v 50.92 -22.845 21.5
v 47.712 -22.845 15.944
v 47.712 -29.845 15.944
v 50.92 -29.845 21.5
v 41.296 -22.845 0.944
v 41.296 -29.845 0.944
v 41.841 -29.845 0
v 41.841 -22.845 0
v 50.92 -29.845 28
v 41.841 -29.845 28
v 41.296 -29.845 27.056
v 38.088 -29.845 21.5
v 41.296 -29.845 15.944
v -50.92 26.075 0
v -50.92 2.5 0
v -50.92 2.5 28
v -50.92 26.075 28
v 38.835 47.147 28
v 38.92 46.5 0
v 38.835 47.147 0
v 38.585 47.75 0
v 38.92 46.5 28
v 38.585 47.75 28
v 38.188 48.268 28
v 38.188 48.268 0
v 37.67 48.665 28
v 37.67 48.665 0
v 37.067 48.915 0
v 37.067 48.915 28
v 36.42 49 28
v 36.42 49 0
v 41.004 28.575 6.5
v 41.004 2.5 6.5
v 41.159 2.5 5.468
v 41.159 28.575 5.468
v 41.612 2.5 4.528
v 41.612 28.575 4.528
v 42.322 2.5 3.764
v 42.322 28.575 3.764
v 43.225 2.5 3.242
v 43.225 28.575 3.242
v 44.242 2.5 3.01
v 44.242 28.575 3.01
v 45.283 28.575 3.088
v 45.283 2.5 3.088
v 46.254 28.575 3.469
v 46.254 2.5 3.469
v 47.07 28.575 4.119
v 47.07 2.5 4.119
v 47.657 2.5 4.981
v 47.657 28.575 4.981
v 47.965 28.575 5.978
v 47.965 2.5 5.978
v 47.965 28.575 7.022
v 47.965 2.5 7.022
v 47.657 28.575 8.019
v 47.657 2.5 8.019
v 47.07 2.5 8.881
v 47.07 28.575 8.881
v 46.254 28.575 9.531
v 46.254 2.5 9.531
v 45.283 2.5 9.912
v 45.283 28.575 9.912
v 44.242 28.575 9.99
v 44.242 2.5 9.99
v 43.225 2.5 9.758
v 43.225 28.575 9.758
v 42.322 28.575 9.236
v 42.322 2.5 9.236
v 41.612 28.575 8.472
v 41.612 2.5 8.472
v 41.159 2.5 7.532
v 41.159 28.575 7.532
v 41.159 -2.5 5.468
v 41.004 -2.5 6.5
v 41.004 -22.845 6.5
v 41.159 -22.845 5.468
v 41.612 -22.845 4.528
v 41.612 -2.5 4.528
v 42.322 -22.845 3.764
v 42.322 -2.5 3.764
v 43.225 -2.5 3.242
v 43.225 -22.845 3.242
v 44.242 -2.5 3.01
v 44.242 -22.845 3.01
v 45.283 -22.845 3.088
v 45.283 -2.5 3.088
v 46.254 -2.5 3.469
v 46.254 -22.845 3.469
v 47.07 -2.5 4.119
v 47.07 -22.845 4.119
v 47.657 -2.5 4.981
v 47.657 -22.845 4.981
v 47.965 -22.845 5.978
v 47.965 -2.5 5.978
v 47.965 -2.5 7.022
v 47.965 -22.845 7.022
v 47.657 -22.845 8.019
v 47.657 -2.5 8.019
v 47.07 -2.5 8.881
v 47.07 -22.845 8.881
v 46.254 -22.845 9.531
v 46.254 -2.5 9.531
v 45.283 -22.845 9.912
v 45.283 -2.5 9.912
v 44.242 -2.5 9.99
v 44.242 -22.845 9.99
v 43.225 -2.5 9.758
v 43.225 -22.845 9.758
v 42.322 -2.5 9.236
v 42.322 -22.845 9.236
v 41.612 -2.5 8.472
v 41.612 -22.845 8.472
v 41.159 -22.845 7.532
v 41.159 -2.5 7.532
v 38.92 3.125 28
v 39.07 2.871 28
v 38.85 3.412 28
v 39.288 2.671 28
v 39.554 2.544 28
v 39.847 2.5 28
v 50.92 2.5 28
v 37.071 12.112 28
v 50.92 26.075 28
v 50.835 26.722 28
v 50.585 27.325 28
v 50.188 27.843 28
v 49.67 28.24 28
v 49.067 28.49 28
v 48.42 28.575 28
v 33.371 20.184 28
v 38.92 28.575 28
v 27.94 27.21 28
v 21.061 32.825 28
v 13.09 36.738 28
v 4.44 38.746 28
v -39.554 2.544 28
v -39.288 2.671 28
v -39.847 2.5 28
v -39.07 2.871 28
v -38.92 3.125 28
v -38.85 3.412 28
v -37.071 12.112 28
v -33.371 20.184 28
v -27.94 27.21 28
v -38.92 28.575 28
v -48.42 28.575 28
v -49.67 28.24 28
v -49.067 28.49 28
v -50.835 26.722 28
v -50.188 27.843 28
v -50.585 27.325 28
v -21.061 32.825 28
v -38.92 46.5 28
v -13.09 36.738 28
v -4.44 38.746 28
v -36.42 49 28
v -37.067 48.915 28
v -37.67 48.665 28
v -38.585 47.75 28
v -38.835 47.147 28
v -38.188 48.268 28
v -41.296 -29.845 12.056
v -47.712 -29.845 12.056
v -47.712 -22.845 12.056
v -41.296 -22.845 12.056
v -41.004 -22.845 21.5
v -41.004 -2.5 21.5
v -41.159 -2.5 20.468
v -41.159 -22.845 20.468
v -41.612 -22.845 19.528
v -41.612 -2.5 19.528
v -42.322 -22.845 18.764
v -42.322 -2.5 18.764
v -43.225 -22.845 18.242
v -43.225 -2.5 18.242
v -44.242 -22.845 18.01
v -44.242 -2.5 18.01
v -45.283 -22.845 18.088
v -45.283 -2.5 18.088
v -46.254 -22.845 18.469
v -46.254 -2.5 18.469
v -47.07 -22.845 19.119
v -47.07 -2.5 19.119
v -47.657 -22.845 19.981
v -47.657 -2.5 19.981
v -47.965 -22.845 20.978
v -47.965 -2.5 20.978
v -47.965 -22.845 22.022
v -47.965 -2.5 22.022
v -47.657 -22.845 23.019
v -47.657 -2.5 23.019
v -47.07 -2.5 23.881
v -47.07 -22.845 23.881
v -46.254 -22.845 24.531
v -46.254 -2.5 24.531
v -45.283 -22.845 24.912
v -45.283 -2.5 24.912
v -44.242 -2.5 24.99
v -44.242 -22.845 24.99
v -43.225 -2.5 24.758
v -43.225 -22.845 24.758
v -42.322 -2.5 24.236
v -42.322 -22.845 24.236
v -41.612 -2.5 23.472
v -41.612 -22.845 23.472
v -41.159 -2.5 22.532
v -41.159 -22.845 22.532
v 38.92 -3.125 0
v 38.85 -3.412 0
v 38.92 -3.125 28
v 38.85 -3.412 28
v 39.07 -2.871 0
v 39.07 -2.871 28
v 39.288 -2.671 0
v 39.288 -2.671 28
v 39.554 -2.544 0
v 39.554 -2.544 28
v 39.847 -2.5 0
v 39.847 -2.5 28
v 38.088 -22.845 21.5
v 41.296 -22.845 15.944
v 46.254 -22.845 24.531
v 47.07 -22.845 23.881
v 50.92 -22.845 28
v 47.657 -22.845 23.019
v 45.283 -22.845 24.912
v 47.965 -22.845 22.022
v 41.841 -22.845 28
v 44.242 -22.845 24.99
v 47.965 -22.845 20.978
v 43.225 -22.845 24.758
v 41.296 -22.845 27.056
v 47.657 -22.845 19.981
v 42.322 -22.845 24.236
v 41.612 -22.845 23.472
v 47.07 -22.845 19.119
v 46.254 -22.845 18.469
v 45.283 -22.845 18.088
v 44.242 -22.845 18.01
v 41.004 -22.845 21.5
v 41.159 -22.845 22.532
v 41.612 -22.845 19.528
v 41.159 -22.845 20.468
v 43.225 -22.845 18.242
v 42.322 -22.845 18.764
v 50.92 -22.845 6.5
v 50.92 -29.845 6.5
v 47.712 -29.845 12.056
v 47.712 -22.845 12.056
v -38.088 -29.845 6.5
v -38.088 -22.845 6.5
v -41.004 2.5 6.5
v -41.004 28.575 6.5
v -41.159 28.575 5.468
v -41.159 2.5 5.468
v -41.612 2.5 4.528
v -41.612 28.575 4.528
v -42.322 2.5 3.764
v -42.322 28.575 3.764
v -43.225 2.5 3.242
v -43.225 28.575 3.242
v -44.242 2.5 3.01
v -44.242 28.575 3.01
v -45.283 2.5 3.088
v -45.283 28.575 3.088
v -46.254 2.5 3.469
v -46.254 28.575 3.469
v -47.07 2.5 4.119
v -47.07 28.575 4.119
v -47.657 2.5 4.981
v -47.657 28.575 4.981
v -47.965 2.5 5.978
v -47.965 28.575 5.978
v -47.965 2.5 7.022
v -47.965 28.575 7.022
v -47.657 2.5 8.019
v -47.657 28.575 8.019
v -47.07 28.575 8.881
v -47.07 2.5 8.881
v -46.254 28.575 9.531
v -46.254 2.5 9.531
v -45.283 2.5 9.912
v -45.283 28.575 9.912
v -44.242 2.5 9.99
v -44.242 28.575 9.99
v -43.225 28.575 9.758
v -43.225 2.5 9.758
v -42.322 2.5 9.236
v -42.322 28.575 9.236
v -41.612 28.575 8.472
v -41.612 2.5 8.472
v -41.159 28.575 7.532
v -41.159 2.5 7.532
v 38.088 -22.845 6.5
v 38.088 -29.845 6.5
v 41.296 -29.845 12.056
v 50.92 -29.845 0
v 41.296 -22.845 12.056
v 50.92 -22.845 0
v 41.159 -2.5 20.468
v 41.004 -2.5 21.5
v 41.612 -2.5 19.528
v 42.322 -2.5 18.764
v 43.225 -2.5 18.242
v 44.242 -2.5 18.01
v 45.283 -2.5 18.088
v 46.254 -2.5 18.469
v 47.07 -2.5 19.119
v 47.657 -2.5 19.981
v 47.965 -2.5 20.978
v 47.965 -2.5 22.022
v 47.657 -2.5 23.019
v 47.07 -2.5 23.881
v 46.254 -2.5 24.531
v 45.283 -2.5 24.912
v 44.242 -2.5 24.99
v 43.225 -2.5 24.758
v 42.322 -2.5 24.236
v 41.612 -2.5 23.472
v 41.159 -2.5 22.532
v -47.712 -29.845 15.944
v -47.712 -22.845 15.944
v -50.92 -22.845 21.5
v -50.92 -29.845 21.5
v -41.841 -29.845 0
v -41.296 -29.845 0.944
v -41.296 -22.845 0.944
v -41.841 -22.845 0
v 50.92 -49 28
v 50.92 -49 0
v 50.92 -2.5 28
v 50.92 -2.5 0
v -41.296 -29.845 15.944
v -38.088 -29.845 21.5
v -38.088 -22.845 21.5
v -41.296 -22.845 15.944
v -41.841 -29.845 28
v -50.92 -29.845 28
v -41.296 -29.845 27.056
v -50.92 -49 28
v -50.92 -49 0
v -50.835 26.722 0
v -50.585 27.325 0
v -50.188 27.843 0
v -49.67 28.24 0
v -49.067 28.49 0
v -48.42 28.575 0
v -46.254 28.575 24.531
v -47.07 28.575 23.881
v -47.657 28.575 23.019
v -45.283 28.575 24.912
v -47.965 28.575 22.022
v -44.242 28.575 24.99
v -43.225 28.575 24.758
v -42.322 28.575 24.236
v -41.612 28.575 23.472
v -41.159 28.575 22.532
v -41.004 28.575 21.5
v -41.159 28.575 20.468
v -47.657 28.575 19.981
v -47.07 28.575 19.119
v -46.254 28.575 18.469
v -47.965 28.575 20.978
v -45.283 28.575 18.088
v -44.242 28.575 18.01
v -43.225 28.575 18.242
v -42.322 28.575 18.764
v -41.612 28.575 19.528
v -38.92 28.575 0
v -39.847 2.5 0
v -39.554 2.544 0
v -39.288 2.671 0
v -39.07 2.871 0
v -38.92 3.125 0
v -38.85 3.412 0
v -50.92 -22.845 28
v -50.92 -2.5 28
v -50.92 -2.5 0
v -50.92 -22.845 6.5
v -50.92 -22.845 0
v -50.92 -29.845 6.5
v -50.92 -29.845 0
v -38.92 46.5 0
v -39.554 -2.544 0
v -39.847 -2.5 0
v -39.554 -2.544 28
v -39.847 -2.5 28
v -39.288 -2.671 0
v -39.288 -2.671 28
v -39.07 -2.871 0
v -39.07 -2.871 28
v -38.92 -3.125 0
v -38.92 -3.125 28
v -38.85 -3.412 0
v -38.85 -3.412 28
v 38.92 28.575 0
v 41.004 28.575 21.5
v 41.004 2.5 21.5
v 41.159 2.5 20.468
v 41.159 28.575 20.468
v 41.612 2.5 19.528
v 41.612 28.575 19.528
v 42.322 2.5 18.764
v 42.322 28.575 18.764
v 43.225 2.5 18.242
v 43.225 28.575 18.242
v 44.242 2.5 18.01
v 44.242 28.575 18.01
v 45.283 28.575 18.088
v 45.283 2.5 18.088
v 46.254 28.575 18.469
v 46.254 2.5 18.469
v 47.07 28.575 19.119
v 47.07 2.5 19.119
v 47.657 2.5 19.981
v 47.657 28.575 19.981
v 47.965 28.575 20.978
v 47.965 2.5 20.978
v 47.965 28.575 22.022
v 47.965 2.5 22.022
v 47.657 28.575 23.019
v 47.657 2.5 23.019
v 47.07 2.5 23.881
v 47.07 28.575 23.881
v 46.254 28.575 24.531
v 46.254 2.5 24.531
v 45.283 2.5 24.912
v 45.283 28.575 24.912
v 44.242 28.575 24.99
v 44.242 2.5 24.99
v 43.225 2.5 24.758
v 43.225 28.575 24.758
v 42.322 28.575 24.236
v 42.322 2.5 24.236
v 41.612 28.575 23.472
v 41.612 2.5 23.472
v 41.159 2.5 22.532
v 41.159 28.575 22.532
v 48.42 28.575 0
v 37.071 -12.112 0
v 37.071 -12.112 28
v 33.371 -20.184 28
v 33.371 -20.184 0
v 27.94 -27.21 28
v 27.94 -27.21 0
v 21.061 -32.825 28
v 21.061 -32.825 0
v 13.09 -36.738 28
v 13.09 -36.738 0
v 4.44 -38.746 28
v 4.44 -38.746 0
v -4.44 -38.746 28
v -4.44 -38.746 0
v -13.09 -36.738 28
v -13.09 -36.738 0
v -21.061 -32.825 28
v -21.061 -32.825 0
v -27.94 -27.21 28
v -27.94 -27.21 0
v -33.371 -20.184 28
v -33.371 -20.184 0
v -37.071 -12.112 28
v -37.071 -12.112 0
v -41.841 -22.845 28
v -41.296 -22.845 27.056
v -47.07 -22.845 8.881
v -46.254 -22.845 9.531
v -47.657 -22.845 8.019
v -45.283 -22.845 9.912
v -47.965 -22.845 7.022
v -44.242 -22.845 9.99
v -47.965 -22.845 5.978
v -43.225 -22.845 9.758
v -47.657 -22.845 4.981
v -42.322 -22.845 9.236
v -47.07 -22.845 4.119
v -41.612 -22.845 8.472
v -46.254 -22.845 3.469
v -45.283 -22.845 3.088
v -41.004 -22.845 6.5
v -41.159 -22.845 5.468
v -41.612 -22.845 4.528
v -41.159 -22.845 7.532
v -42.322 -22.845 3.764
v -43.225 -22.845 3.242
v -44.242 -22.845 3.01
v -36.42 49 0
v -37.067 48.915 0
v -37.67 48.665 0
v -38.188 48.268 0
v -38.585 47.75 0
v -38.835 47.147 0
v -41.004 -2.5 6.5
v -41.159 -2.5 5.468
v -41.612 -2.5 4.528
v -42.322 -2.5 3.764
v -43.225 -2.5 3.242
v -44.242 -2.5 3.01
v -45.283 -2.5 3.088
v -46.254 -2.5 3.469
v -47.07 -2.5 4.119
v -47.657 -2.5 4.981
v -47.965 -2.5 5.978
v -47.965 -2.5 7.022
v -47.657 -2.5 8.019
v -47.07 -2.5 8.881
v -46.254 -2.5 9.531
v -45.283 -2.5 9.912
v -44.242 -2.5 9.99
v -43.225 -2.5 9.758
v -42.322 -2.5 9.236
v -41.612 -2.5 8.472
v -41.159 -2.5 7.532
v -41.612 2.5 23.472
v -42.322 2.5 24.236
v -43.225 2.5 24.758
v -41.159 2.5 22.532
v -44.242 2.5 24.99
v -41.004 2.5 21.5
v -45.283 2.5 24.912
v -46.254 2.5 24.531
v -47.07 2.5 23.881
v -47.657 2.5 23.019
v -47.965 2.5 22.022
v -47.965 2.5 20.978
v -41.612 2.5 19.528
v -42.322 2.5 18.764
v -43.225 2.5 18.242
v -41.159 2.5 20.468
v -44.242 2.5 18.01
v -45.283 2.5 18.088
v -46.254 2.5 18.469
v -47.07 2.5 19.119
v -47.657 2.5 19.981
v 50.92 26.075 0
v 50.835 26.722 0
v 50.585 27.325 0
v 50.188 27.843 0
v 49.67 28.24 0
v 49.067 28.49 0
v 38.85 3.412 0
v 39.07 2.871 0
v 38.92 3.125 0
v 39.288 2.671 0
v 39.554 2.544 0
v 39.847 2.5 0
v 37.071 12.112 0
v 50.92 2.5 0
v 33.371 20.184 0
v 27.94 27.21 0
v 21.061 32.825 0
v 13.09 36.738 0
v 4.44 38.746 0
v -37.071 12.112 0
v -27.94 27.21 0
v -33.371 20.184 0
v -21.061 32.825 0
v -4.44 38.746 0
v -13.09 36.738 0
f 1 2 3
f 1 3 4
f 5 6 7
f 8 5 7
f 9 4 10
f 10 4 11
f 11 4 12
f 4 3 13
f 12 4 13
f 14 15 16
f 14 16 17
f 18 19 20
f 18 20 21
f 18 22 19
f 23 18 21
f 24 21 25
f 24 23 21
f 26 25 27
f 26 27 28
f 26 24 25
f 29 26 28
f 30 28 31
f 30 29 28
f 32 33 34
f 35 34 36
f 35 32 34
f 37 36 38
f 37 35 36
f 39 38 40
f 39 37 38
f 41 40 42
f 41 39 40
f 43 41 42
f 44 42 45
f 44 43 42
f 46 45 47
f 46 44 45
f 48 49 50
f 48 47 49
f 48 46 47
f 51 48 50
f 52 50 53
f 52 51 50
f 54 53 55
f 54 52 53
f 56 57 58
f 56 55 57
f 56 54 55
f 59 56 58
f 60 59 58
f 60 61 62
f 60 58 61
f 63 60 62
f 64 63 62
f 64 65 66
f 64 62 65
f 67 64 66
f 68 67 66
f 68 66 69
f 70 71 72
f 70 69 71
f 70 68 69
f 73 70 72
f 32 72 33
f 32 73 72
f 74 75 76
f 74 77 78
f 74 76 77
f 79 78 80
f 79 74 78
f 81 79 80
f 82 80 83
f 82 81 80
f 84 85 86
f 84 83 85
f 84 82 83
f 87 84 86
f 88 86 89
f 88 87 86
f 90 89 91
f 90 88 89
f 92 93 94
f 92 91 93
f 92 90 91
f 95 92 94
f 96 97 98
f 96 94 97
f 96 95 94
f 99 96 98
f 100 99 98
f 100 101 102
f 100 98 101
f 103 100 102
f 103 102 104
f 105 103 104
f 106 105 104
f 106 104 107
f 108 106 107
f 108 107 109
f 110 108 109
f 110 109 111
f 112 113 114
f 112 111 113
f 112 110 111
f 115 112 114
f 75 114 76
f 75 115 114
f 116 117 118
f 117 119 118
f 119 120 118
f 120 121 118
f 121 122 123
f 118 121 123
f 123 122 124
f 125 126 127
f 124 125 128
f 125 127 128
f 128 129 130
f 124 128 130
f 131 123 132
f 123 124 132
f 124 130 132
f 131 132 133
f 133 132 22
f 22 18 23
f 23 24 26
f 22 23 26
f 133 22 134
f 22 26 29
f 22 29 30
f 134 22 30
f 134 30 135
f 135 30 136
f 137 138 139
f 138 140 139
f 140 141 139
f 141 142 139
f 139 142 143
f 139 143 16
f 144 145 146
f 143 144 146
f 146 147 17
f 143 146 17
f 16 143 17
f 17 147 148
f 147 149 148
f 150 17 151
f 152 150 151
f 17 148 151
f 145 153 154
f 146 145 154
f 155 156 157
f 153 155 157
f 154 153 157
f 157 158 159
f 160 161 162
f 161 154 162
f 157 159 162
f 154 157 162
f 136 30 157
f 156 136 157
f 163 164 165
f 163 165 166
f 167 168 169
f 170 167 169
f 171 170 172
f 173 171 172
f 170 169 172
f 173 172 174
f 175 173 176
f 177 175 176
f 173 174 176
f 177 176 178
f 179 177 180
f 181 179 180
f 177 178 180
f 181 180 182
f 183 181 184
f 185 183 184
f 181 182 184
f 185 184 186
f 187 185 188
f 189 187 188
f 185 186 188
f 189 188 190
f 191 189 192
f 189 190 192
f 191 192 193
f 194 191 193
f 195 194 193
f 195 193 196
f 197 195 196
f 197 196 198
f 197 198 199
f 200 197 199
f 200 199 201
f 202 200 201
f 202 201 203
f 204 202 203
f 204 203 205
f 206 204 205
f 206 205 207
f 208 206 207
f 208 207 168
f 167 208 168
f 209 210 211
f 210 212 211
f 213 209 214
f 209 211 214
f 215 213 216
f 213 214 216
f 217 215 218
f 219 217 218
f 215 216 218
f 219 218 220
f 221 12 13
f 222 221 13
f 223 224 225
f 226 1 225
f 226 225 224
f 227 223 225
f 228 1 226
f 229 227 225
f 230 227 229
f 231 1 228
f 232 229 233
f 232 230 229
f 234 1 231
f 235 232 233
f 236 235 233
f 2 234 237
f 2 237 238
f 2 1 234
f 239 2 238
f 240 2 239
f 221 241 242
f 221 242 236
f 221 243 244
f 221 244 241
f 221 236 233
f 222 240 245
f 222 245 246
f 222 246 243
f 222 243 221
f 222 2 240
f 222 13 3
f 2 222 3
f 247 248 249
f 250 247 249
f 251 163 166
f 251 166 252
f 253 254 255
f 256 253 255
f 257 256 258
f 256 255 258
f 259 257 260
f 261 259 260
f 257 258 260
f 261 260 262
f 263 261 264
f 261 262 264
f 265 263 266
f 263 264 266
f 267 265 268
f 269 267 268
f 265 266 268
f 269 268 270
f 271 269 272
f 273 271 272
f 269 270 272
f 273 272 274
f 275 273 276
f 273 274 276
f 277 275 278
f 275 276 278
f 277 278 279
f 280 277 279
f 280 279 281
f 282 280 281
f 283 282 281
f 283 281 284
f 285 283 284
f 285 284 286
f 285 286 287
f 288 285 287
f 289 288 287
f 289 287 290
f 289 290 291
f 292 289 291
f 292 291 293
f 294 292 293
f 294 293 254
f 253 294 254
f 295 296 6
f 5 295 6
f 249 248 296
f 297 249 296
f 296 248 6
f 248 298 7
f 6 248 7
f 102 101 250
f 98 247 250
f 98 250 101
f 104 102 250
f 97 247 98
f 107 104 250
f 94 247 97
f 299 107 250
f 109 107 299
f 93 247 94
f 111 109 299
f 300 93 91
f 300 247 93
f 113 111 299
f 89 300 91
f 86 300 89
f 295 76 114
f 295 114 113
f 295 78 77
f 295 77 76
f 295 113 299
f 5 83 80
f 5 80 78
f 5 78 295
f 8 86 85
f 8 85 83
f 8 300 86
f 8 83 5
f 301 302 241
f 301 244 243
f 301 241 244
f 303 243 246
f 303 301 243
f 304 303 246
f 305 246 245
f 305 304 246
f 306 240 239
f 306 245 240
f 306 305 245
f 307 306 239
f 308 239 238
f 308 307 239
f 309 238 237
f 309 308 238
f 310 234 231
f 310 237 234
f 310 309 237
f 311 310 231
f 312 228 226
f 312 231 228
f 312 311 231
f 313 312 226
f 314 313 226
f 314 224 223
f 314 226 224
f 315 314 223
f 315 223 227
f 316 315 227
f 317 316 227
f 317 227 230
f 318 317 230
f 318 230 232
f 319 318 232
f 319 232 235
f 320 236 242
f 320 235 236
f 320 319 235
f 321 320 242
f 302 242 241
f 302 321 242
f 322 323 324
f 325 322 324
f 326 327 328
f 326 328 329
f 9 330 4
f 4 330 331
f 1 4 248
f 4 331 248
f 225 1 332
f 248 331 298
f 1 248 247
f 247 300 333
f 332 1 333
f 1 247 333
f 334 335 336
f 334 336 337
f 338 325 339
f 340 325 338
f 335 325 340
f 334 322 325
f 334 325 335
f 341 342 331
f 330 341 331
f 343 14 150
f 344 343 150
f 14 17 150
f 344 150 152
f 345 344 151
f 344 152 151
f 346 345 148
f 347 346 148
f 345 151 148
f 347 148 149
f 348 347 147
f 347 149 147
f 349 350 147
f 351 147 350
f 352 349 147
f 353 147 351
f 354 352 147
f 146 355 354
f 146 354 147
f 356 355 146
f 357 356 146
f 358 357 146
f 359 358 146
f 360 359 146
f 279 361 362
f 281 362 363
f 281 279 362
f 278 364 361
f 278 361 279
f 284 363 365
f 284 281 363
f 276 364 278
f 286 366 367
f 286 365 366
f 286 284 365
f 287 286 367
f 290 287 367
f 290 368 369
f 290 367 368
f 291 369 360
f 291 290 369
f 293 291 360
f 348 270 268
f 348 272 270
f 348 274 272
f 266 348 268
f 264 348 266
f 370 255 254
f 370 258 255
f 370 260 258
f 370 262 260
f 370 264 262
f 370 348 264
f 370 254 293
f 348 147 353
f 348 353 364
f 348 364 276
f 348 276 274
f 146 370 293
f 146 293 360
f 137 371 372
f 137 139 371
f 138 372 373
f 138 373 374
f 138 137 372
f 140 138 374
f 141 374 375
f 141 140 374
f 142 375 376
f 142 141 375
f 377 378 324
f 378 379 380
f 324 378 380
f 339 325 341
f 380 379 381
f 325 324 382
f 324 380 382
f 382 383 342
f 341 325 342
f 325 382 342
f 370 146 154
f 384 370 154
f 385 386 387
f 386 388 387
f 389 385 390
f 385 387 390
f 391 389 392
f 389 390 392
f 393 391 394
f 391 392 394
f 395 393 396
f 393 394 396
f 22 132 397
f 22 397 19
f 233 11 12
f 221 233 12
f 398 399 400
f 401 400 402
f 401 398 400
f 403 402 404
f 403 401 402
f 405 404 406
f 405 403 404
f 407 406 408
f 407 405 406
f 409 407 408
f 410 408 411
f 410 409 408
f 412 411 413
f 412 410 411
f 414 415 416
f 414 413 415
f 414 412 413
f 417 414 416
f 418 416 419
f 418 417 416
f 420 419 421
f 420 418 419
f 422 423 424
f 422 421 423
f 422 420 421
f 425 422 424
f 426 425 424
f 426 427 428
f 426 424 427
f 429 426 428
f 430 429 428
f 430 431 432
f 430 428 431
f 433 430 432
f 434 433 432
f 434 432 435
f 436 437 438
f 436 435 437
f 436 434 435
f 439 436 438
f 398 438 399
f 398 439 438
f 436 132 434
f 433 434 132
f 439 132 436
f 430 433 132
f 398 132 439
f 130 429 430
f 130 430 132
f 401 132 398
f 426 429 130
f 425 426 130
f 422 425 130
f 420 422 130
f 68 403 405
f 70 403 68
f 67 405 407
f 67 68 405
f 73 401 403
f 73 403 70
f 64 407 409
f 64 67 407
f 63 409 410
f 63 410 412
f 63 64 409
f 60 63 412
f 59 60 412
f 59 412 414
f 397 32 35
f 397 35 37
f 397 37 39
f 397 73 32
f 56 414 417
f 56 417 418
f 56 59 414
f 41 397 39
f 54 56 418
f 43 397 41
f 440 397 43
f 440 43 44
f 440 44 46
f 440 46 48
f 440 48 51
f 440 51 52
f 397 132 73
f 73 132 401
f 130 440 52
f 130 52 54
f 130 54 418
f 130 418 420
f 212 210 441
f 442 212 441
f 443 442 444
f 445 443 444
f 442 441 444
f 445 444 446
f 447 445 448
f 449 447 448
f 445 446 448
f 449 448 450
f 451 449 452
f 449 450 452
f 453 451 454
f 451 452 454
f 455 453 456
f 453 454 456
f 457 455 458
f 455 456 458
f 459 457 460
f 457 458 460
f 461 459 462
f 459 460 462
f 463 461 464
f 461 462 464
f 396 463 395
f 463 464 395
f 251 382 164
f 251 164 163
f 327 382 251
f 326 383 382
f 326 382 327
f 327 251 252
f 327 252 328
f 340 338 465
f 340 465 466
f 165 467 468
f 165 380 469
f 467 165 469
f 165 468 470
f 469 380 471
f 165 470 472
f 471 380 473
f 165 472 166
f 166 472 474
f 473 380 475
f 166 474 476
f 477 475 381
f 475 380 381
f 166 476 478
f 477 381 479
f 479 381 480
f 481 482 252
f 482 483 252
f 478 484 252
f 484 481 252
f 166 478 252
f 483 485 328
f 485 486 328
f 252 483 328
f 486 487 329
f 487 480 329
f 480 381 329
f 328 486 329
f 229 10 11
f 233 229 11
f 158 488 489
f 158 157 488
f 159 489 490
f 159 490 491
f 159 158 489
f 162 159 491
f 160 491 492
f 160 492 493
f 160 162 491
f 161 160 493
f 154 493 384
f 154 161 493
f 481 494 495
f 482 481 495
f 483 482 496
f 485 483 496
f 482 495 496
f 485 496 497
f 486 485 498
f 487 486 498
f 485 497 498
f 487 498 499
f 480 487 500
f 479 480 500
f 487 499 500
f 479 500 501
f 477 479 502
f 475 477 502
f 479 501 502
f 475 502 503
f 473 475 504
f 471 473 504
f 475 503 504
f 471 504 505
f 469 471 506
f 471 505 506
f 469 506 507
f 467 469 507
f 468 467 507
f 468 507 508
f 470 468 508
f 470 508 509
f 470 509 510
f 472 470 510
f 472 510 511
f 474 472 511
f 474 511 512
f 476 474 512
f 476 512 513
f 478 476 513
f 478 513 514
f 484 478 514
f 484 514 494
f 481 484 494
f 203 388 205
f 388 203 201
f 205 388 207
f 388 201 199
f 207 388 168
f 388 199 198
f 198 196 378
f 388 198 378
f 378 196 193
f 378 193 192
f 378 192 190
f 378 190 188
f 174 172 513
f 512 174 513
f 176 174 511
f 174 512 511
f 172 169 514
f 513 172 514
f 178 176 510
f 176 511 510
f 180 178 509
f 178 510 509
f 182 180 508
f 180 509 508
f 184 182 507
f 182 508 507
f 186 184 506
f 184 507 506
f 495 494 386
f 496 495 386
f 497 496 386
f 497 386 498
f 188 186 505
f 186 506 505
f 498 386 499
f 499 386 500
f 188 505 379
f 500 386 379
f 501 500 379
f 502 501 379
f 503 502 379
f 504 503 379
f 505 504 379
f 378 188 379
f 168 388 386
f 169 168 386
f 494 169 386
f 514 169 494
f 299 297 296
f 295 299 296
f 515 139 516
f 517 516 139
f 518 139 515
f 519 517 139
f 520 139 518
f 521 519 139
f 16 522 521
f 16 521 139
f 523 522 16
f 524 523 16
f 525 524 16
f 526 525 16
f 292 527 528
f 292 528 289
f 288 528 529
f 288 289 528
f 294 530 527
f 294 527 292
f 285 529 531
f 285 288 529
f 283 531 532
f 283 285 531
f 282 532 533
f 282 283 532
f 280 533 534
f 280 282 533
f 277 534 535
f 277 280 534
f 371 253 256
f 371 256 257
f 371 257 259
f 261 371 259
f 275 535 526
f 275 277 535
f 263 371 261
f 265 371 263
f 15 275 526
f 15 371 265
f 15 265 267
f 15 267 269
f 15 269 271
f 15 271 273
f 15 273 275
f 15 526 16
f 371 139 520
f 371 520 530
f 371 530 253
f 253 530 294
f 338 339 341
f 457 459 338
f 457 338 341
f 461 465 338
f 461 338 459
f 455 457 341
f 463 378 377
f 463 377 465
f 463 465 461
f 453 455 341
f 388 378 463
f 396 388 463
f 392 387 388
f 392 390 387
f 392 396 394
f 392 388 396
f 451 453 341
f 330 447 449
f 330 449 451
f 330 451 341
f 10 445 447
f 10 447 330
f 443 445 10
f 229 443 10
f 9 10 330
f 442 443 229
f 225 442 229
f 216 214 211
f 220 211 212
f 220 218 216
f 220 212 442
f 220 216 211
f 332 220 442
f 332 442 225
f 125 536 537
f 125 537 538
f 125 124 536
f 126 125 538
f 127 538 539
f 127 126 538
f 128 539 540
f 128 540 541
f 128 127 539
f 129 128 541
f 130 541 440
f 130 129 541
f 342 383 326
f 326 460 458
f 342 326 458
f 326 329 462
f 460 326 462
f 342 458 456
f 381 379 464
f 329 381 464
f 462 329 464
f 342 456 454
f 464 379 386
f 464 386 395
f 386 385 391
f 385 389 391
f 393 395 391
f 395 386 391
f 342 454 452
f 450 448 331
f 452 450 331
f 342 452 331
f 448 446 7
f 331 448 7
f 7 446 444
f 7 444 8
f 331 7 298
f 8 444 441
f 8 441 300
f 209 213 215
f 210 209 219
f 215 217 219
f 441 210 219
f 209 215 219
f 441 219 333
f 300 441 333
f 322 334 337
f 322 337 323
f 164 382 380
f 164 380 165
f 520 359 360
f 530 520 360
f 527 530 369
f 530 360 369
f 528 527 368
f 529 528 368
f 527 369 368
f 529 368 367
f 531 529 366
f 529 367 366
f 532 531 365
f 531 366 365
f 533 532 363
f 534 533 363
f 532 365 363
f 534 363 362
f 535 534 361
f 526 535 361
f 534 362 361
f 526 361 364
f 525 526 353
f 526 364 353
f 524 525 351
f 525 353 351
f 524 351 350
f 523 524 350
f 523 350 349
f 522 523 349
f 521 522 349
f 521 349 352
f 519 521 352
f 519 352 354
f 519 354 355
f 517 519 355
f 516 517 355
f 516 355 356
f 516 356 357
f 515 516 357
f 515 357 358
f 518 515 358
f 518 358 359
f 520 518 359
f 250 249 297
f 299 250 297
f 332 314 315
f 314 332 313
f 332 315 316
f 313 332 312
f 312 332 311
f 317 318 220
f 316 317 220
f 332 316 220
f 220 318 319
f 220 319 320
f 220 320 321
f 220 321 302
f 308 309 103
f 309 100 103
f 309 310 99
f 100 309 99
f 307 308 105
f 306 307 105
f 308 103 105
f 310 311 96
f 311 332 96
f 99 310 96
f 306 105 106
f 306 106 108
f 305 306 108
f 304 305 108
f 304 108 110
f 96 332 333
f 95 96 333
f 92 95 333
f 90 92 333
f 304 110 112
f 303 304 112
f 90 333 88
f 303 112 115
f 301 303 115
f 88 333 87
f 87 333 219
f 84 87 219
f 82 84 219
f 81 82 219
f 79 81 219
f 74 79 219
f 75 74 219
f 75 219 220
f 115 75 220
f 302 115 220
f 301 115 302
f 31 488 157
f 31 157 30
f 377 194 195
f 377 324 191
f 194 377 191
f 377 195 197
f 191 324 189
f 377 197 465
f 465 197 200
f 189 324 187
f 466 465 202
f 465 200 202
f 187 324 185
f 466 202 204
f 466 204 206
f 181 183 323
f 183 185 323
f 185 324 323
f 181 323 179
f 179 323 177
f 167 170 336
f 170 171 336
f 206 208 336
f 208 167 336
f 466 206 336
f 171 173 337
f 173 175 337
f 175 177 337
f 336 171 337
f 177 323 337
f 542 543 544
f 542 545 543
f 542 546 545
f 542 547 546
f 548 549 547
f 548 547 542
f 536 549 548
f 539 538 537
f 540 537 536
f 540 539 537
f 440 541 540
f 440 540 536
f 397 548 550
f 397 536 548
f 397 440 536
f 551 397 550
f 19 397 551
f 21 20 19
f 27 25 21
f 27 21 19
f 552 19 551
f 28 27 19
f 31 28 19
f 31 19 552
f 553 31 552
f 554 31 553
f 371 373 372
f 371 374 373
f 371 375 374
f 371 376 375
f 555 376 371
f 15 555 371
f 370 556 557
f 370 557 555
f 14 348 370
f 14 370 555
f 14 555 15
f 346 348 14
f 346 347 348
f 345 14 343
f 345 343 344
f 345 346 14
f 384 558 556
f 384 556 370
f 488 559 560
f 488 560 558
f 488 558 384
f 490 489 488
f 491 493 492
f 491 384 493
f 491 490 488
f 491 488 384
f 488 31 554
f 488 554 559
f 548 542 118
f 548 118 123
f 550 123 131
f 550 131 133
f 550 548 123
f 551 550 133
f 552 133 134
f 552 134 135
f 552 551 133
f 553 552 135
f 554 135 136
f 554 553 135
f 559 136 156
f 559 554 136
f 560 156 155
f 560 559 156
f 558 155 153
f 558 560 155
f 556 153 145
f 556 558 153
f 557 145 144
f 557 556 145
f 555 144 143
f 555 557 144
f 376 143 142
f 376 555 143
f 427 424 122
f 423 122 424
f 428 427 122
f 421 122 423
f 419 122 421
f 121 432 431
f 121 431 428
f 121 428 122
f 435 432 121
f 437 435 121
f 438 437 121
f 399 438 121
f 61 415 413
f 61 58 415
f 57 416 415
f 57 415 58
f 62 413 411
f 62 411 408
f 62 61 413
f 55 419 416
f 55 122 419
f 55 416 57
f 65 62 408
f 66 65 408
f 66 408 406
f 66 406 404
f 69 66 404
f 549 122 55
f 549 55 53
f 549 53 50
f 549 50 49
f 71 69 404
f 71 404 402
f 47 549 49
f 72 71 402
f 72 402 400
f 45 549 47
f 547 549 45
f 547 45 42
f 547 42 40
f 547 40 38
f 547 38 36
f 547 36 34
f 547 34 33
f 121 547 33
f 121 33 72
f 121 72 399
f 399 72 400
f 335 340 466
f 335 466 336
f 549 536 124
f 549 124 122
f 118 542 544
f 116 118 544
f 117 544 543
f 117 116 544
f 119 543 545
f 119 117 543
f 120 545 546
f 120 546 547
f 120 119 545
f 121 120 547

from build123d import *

# Parameters (mm, degrees)
BOSS_EXTRUDE1_DEPTH     = 28
BOSS_EXTRUDE2_DEPTH     = 28
SKETCH3_R               = 3.5
CUT_EXTRUDE1_DEPTH      = 58.42
FILLET1_R               = 1
FILLET2_R               = 1
SKETCH5_W               = 12
SKETCH5_H               = 20.425
CUT_EXTRUDE3_DEPTH      = 29
CUT_EXTRUDE3_DEPTH_BACK = 1
FILLET3_R               = 2.5
CUT_EXTRUDE4_DEPTH      = 7


with BuildPart() as part:
    # Sketch1 → Boss-Extrude1 (new body)
    with BuildSketch(Plane.XY):
        with BuildLine():
            Line((-38.919789311, -2.5), (-50.919789311, -2.5))
            Line((-50.919789311, -2.5), (-50.919789311, -49))
            Line((-50.919789311, -49), (50.919789311, -49))
            Line((50.919789311, -49), (50.919789311, -2.5))
            Line((50.919789311, -2.5), (38.919789311, -2.5))
            ThreePointArc((38.919789311, -2.5), (0, -39), (-38.919789311, -2.5))
        make_face()
    extrude(amount=BOSS_EXTRUDE1_DEPTH)


with BuildPart() as body_2:
    # Sketch2 → Boss-Extrude2 (new body)
    with BuildSketch(Plane.XY):
        with BuildLine():
            Line((-38.919789311, 2.5), (-50.919789311, 2.5))
            Line((-50.919789311, 2.5), (-50.919789311, 49))
            Line((-50.919789311, 49), (50.919789311, 49))
            Line((50.919789311, 49), (50.919789311, 2.5))
            Line((50.919789311, 2.5), (38.919789311, 2.5))
            ThreePointArc((38.919789311, 2.5), (0, 39), (-38.919789311, 2.5))
        make_face()
    extrude(amount=BOSS_EXTRUDE2_DEPTH)


with BuildPart() as cut_extrude1_tool:
    # Sketch3 → Cut-Extrude1 (new body)
    with BuildSketch(Plane(origin=(0, 28.575, 0), x_dir=(1, 0, 0), z_dir=(0, 1, 0))):
        with Locations((-44.503984444, -6.5)):
            Circle(SKETCH3_R)
        with Locations((-44.503984444, -21.5)):
            Circle(SKETCH3_R)
    cut_extrude1 = extrude(amount=-CUT_EXTRUDE1_DEPTH)


with BuildPart() as part_1:
    add(part.part)

    # Cut-Extrude1: cut by cut_extrude1_tool
    add(cut_extrude1_tool.part, mode=Mode.SUBTRACT)

    # Fillet1
    fillet1_edges = [part_1.edges().sort_by_distance(p)[0] for p in [
        (38.919789311, -2.5, 14),
        (-38.919789311, -2.5, 14),
    ]]
    fillet(fillet1_edges, radius=FILLET1_R)

    # Sketch7 → Cut-Extrude4 (cut)
    with BuildSketch(Plane(origin=(0, -29.845, 0), x_dir=(1, 0, 0), z_dir=(0, 1, 0))):
        Polygon((-38.088179578, -6.5), (-41.296082011, -0.94375), (-41.840956328, 0), (-50.919789311, 0), (-50.919789311, -6.5), (-47.711886878, -12.05625), (-41.296082011, -12.05625), align=None)
        Polygon((-50.919789311, -28), (-41.840956328, -28), (-41.296082011, -27.05625), (-38.088179578, -21.5), (-41.296082011, -15.94375), (-47.711886878, -15.94375), (-50.919789311, -21.5), align=None)
    cut_extrude4 = extrude(amount=CUT_EXTRUDE4_DEPTH, mode=Mode.SUBTRACT)


with BuildPart() as body_2_1:
    add(body_2.part)

    # Cut-Extrude1: cut by cut_extrude1_tool
    add(cut_extrude1_tool.part, mode=Mode.SUBTRACT)

    # Fillet2
    fillet2_edges = [body_2_1.edges().sort_by_distance(p)[0] for p in [
        (-38.919789311, 2.5, 14),
        (38.919789311, 2.5, 14),
    ]]
    fillet(fillet2_edges, radius=FILLET2_R)

    # Sketch5 → Cut-Extrude3 (cut, two sides)
    with BuildSketch(Plane.XY) as cut_extrude3_sk:
        with Locations((-44.919789311, 38.7875)):
            Rectangle(SKETCH5_W, SKETCH5_H)
        with Locations((44.919789311, 38.7875)):
            Rectangle(SKETCH5_W, SKETCH5_H)
    extrude(amount=CUT_EXTRUDE3_DEPTH, mode=Mode.SUBTRACT)
    extrude(cut_extrude3_sk.sketch, amount=-CUT_EXTRUDE3_DEPTH_BACK, mode=Mode.SUBTRACT)

    # Fillet3
    fillet3_edges = [body_2_1.edges().sort_by_distance(p)[0] for p in [
        (-50.919789311, 28.575, 14),
        (-38.919789311, 49, 14),
        (38.919789311, 49, 14),
        (50.919789311, 28.575, 14),
    ]]
    fillet(fillet3_edges, radius=FILLET3_R)


with BuildPart() as mirror3_tool:
    # Mirror3: Cut-Extrude1, Cut-Extrude4 across plane
    add(cut_extrude1.mirror(Plane(origin=(0, 0, 0), x_dir=(0, 0, 1), z_dir=(1, 0, 0))))
    add(cut_extrude4.mirror(Plane(origin=(0, 0, 0), x_dir=(0, 0, 1), z_dir=(1, 0, 0))))


with BuildPart() as part_2:
    add(part_1.part)

    # Mirror3: cut by mirror3_tool
    add(mirror3_tool.part, mode=Mode.SUBTRACT)


with BuildPart() as body_2_2:
    add(body_2_1.part)

    # Mirror3: cut by mirror3_tool
    add(mirror3_tool.part, mode=Mode.SUBTRACT)


solid = Compound([part_2.part, body_2_2.part])
